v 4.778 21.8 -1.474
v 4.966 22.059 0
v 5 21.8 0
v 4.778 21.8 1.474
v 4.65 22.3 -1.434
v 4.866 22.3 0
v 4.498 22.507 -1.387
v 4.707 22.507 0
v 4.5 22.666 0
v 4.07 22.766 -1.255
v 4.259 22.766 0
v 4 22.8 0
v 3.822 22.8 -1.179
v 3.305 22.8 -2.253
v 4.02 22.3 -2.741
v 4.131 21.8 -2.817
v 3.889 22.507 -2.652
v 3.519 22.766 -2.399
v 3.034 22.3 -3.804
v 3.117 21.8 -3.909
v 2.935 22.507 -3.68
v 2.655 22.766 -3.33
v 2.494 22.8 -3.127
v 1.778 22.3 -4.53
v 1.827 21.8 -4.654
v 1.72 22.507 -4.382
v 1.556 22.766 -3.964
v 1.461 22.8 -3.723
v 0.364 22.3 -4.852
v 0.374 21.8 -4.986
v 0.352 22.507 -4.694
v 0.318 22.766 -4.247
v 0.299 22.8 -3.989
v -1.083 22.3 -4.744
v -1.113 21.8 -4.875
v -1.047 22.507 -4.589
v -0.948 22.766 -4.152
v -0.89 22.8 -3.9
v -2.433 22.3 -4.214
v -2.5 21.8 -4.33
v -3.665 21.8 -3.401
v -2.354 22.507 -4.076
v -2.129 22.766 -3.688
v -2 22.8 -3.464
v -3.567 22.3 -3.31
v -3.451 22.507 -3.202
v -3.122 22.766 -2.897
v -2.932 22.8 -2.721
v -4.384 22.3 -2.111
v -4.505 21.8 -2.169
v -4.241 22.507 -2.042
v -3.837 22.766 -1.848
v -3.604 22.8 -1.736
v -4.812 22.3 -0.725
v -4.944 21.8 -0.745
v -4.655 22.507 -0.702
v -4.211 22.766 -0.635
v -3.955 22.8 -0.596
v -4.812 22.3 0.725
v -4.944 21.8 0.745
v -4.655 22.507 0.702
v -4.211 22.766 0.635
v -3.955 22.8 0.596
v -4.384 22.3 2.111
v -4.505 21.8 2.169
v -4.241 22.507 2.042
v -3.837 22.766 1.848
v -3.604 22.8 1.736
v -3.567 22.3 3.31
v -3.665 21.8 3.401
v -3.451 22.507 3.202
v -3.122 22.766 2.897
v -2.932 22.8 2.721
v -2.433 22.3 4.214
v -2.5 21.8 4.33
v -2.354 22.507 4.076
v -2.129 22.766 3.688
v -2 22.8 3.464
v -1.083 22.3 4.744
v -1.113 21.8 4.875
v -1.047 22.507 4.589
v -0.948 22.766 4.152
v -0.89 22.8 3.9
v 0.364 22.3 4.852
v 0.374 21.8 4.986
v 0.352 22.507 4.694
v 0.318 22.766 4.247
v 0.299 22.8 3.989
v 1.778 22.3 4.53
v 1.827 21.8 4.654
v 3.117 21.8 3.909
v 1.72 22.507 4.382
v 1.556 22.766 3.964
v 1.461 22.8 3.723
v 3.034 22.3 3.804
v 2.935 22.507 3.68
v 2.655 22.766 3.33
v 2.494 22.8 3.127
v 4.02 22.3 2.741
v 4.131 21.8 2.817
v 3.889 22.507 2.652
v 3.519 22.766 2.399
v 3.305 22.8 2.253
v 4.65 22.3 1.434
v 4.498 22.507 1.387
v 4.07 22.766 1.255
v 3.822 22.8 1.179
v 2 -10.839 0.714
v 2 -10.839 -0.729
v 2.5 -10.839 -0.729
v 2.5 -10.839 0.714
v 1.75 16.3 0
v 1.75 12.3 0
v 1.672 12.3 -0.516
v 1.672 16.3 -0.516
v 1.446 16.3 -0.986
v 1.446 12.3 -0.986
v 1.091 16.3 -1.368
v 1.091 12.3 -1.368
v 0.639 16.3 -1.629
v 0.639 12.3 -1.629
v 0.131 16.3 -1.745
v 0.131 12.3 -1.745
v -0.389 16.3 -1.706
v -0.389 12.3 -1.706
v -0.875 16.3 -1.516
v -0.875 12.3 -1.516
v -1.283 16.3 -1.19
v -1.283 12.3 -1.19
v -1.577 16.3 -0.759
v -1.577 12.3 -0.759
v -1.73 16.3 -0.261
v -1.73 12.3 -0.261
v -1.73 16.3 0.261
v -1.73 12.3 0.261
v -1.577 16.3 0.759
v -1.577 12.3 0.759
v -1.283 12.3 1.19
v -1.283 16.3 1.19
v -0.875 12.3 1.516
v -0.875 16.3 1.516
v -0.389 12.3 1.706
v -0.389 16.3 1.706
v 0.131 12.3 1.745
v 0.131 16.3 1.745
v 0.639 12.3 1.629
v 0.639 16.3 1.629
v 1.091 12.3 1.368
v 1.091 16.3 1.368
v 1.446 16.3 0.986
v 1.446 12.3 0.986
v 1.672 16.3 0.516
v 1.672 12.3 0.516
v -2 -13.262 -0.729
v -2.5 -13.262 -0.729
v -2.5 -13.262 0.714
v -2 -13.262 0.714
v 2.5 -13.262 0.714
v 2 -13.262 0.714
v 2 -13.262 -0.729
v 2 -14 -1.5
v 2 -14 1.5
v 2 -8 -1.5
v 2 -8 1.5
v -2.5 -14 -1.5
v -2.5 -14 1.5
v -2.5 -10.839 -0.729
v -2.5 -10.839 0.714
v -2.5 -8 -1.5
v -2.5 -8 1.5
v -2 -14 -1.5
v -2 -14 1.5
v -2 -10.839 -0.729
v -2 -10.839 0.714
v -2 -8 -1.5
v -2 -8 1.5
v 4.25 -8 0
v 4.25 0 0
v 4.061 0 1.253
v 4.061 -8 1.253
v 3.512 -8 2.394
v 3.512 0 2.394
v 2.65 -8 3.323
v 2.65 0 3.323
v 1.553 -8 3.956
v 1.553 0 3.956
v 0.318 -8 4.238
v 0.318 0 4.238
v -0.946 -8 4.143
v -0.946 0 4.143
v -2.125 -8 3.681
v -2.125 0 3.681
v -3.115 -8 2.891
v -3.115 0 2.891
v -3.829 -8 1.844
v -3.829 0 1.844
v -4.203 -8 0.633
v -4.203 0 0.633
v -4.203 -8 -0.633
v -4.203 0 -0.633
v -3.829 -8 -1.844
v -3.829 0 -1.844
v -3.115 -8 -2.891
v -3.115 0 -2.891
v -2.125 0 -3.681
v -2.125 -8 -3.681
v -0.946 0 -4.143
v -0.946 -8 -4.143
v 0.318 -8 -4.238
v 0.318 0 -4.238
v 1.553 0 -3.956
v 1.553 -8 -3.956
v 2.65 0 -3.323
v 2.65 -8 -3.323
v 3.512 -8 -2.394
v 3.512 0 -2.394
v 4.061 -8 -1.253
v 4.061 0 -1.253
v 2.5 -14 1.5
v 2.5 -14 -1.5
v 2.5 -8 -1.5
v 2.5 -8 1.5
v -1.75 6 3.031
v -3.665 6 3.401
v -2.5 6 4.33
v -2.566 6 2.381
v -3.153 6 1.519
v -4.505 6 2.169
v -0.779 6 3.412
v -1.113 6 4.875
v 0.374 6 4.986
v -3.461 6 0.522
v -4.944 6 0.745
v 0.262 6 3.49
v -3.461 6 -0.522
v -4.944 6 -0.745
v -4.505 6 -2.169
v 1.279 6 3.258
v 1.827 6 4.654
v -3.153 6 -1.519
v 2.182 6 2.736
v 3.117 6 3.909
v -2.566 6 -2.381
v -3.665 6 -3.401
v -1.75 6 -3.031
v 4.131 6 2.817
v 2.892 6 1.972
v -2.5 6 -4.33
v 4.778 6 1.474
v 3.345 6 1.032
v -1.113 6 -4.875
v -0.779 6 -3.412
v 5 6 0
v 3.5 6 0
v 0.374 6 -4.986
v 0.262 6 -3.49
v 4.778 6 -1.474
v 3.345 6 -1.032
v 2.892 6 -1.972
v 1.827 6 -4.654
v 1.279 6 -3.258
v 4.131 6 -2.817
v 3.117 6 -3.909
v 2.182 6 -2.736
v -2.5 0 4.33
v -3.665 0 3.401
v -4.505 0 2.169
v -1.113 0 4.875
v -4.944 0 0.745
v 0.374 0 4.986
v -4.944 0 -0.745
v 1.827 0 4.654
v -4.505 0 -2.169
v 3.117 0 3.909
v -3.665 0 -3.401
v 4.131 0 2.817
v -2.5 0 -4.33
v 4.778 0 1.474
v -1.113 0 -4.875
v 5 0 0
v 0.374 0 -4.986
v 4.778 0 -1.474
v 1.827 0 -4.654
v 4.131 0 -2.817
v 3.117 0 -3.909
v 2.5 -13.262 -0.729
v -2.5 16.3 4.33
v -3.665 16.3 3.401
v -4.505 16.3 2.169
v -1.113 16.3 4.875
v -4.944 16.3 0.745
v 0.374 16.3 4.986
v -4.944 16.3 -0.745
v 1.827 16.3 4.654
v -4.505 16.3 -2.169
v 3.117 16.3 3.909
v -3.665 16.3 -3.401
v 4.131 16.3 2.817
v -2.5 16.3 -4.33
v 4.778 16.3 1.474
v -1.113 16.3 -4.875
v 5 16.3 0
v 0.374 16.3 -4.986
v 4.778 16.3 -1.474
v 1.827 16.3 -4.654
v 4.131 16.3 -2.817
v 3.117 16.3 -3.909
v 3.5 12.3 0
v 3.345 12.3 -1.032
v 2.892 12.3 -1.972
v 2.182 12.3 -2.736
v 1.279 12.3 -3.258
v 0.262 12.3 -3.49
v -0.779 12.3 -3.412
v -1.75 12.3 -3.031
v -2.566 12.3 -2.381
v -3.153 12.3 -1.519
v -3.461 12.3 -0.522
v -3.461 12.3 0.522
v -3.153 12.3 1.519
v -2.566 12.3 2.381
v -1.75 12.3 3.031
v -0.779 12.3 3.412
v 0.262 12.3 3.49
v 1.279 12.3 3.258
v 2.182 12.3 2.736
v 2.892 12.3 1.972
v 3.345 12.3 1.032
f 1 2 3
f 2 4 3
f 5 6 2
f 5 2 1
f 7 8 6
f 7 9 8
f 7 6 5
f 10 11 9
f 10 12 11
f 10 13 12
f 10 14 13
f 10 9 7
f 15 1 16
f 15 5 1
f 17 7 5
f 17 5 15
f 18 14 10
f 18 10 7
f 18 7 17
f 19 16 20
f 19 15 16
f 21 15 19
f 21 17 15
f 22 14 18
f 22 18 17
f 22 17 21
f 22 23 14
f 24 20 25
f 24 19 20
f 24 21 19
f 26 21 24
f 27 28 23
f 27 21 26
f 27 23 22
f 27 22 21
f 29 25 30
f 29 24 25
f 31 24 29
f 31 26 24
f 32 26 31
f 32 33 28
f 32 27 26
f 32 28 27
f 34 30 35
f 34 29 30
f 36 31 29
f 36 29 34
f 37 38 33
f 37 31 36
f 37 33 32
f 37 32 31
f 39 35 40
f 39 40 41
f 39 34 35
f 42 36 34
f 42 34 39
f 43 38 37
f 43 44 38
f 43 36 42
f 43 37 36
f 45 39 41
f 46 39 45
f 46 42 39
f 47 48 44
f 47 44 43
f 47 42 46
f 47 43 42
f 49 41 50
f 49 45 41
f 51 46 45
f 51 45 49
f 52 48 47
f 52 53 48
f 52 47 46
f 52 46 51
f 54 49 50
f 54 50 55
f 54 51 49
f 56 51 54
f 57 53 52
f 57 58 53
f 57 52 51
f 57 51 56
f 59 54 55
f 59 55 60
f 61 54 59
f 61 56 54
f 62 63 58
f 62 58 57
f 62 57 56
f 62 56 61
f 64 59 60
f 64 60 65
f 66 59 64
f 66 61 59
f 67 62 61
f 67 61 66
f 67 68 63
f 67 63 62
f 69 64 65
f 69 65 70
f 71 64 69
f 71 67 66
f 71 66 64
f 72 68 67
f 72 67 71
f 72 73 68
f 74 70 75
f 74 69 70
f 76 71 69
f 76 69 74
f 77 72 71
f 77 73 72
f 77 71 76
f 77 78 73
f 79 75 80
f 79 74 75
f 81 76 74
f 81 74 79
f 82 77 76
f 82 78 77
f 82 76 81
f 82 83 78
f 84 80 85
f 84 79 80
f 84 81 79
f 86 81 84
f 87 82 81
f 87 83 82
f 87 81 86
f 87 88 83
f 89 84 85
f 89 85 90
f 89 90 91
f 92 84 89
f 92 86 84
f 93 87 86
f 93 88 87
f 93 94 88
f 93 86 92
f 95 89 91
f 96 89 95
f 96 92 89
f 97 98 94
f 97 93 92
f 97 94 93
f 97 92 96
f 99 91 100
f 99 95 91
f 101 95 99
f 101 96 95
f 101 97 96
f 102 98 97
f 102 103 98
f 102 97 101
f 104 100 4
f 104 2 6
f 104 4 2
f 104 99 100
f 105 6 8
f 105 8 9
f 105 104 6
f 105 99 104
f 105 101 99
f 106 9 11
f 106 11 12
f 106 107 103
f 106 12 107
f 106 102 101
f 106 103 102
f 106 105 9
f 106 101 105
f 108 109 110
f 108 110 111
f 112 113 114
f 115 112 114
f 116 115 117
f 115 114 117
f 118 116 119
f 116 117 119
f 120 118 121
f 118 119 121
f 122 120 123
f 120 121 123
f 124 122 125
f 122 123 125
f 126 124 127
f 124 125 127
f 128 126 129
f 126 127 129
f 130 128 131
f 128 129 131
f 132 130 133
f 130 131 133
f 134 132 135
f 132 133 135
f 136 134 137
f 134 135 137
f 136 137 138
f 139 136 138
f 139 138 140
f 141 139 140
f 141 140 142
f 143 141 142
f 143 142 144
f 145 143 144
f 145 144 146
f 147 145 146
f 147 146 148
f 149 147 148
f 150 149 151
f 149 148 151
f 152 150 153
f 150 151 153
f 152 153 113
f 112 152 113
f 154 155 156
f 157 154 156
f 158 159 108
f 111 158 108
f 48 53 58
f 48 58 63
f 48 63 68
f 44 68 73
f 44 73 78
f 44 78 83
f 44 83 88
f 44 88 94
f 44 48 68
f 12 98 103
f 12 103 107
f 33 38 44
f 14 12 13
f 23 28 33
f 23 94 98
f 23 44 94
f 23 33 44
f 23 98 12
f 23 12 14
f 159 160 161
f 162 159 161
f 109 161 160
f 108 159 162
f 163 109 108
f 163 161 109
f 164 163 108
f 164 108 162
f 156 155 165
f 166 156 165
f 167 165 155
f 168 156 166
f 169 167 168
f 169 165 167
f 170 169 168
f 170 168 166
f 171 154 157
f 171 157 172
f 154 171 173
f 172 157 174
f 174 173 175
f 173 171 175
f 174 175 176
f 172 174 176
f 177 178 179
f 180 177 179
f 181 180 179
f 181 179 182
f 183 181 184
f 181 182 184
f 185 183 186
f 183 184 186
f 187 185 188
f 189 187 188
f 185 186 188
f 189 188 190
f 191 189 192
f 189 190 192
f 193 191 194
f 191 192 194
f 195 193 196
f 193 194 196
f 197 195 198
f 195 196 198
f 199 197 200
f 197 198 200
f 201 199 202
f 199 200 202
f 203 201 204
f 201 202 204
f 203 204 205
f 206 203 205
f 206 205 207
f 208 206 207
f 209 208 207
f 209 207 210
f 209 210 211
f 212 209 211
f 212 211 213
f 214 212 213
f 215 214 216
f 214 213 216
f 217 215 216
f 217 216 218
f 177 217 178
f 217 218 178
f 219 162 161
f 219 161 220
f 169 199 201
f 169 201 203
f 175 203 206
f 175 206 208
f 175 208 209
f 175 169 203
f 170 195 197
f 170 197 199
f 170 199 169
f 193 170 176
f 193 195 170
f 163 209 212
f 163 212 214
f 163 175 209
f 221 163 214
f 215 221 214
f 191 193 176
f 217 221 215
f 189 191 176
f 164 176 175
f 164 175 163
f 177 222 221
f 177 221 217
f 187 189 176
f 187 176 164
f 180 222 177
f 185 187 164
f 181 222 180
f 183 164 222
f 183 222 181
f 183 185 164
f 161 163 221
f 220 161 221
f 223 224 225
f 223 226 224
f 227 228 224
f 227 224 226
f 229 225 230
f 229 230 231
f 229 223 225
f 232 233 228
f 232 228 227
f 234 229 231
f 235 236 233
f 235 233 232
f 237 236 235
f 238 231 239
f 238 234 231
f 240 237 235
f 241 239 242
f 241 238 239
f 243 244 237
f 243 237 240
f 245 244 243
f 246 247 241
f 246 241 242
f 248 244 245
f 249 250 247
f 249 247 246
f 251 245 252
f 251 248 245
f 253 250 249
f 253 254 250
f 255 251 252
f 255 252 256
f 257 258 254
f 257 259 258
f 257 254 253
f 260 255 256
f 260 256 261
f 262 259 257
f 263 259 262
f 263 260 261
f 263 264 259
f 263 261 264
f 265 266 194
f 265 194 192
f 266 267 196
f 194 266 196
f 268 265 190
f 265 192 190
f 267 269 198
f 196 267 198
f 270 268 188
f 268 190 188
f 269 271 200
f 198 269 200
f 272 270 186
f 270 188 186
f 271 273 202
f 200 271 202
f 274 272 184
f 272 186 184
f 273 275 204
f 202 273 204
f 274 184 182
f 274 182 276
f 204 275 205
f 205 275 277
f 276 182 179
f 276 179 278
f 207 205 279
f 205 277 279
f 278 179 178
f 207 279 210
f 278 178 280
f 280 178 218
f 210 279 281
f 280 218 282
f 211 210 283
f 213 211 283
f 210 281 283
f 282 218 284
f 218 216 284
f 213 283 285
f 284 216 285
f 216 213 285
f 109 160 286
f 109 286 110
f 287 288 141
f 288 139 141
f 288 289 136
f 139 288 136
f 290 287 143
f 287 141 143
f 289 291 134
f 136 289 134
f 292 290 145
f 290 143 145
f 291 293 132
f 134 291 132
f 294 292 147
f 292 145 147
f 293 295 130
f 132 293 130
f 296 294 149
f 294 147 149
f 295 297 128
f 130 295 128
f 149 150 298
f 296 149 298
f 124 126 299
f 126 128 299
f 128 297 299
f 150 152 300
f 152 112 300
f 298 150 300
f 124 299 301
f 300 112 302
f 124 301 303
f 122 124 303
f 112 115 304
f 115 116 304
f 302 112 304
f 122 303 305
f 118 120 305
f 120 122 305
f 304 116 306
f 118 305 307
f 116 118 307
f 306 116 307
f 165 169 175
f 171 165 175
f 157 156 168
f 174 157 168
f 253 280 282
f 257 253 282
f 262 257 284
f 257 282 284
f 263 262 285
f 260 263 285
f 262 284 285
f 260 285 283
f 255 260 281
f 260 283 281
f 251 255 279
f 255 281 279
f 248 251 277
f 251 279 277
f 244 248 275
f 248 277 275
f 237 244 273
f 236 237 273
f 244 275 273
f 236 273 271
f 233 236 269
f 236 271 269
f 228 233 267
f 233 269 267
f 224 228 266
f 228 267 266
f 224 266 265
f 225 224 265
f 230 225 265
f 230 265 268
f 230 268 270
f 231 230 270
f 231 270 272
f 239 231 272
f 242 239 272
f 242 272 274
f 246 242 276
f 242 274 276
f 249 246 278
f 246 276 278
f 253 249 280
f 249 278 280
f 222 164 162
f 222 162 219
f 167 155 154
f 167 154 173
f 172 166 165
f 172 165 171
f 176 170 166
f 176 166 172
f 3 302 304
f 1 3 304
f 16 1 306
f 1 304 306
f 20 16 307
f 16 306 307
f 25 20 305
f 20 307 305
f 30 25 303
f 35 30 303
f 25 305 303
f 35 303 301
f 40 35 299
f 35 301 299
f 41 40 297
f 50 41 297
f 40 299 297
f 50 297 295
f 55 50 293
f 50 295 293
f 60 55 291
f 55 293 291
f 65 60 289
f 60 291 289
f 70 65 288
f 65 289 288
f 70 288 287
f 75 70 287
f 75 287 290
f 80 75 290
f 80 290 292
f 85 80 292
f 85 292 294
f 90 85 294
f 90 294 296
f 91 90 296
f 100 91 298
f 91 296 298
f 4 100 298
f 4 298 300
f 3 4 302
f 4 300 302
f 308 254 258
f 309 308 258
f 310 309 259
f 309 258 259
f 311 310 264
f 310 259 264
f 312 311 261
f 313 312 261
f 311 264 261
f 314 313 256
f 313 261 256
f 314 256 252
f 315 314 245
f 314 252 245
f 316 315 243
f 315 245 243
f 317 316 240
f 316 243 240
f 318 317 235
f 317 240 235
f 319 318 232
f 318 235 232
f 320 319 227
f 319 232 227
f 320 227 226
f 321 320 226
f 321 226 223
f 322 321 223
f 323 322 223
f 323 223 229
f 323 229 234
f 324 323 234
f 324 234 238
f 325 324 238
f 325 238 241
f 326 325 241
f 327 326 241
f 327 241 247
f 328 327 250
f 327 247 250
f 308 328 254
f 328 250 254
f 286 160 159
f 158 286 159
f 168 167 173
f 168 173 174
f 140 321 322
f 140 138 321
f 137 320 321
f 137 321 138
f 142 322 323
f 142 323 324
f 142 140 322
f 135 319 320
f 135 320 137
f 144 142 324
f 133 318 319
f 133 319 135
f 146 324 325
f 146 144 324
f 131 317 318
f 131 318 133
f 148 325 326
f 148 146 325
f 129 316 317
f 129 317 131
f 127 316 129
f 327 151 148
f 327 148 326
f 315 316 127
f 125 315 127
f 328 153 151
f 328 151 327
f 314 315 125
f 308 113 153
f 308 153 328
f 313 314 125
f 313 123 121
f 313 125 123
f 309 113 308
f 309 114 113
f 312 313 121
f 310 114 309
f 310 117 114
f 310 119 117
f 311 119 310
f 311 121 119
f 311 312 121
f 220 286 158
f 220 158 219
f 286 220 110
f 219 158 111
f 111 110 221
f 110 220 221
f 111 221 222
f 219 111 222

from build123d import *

# Parameters (mm, degrees)
ESBO_O1_R                = 5
RESSALTO_EXTRUS_O1_DEPTH = 6
ESBO_O2_R                = 4.25
RESSALTO_EXTRUS_O2_DEPTH = 8
ESBO_O3_W                = 0.5
ESBO_O3_H                = 3
RESSALTO_EXTRUS_O3_DEPTH = 6
ESBO_O4_W                = 1.442967266
ESBO_O4_H                = 2.423445024
CORTE_EXTRUS_O1_DEPTH    = 8.5
ESBO_O5_R                = 3.5
RESSALTO_EXTRUS_O4_DEPTH = 6.3
ESBO_O6_R                = 1.75
RESSALTO_EXTRUS_O5_DEPTH = 4
ESBO_O7_R                = 5
RESSALTO_EXTRUS_O6_DEPTH = 6.5
FILETE1_R                = 1


with BuildPart() as part:
    # Esboço1 → Ressalto-extrusão1 (new body)
    with BuildSketch(Plane(origin=(0, 0, 0), x_dir=(1, 0, 0), z_dir=(0, 1, 0))):
        Circle(ESBO_O1_R)
    extrude(amount=RESSALTO_EXTRUS_O1_DEPTH)

    # Esboço2 → Ressalto-extrusão2 (add)
    with BuildSketch(Plane.XZ):
        Circle(ESBO_O2_R)
    extrude(amount=RESSALTO_EXTRUS_O2_DEPTH)

    # Esboço3 → Ressalto-extrusão3 (add)
    with BuildSketch(Plane.XZ.offset(8)):
        with Locations((2.25, 0)):
            Rectangle(ESBO_O3_W, ESBO_O3_H)
        with Locations((-2.25, 0)):
            Rectangle(ESBO_O3_W, ESBO_O3_H)
    extrude(amount=RESSALTO_EXTRUS_O3_DEPTH)

    # Esboço4 → Corte-extrusão1 (cut, through all)
    with BuildSketch(Plane.ZY.offset(2.5)):
        with Locations((-0.007097641, -12.050464305)):
            Rectangle(ESBO_O4_W, ESBO_O4_H)
    extrude(amount=-CORTE_EXTRUS_O1_DEPTH, mode=Mode.SUBTRACT)

    # Esboço5 → Ressalto-extrusão4 (add)
    with BuildSketch(Plane(origin=(0, 6, 0), x_dir=(1, 0, 0), z_dir=(0, 1, 0))):
        Circle(ESBO_O5_R)
    extrude(amount=RESSALTO_EXTRUS_O4_DEPTH)

    # Esboço6 → Ressalto-extrusão5 (add)
    with BuildSketch(Plane(origin=(0, 12.3, 0), x_dir=(1, 0, 0), z_dir=(0, 1, 0))):
        Circle(ESBO_O6_R)
    extrude(amount=RESSALTO_EXTRUS_O5_DEPTH)

    # Esboço7 → Ressalto-extrusão6 (add)
    with BuildSketch(Plane(origin=(0, 16.3, 0), x_dir=(1, 0, 0), z_dir=(0, 1, 0))):
        Circle(ESBO_O7_R)
    extrude(amount=RESSALTO_EXTRUS_O6_DEPTH)

    # Filete1
    filete1_edges = [part.edges().sort_by_distance(p)[0] for p in [
        (-5, 22.8, 0),
    ]]
    fillet(filete1_edges, radius=FILETE1_R)


solid = part.part
